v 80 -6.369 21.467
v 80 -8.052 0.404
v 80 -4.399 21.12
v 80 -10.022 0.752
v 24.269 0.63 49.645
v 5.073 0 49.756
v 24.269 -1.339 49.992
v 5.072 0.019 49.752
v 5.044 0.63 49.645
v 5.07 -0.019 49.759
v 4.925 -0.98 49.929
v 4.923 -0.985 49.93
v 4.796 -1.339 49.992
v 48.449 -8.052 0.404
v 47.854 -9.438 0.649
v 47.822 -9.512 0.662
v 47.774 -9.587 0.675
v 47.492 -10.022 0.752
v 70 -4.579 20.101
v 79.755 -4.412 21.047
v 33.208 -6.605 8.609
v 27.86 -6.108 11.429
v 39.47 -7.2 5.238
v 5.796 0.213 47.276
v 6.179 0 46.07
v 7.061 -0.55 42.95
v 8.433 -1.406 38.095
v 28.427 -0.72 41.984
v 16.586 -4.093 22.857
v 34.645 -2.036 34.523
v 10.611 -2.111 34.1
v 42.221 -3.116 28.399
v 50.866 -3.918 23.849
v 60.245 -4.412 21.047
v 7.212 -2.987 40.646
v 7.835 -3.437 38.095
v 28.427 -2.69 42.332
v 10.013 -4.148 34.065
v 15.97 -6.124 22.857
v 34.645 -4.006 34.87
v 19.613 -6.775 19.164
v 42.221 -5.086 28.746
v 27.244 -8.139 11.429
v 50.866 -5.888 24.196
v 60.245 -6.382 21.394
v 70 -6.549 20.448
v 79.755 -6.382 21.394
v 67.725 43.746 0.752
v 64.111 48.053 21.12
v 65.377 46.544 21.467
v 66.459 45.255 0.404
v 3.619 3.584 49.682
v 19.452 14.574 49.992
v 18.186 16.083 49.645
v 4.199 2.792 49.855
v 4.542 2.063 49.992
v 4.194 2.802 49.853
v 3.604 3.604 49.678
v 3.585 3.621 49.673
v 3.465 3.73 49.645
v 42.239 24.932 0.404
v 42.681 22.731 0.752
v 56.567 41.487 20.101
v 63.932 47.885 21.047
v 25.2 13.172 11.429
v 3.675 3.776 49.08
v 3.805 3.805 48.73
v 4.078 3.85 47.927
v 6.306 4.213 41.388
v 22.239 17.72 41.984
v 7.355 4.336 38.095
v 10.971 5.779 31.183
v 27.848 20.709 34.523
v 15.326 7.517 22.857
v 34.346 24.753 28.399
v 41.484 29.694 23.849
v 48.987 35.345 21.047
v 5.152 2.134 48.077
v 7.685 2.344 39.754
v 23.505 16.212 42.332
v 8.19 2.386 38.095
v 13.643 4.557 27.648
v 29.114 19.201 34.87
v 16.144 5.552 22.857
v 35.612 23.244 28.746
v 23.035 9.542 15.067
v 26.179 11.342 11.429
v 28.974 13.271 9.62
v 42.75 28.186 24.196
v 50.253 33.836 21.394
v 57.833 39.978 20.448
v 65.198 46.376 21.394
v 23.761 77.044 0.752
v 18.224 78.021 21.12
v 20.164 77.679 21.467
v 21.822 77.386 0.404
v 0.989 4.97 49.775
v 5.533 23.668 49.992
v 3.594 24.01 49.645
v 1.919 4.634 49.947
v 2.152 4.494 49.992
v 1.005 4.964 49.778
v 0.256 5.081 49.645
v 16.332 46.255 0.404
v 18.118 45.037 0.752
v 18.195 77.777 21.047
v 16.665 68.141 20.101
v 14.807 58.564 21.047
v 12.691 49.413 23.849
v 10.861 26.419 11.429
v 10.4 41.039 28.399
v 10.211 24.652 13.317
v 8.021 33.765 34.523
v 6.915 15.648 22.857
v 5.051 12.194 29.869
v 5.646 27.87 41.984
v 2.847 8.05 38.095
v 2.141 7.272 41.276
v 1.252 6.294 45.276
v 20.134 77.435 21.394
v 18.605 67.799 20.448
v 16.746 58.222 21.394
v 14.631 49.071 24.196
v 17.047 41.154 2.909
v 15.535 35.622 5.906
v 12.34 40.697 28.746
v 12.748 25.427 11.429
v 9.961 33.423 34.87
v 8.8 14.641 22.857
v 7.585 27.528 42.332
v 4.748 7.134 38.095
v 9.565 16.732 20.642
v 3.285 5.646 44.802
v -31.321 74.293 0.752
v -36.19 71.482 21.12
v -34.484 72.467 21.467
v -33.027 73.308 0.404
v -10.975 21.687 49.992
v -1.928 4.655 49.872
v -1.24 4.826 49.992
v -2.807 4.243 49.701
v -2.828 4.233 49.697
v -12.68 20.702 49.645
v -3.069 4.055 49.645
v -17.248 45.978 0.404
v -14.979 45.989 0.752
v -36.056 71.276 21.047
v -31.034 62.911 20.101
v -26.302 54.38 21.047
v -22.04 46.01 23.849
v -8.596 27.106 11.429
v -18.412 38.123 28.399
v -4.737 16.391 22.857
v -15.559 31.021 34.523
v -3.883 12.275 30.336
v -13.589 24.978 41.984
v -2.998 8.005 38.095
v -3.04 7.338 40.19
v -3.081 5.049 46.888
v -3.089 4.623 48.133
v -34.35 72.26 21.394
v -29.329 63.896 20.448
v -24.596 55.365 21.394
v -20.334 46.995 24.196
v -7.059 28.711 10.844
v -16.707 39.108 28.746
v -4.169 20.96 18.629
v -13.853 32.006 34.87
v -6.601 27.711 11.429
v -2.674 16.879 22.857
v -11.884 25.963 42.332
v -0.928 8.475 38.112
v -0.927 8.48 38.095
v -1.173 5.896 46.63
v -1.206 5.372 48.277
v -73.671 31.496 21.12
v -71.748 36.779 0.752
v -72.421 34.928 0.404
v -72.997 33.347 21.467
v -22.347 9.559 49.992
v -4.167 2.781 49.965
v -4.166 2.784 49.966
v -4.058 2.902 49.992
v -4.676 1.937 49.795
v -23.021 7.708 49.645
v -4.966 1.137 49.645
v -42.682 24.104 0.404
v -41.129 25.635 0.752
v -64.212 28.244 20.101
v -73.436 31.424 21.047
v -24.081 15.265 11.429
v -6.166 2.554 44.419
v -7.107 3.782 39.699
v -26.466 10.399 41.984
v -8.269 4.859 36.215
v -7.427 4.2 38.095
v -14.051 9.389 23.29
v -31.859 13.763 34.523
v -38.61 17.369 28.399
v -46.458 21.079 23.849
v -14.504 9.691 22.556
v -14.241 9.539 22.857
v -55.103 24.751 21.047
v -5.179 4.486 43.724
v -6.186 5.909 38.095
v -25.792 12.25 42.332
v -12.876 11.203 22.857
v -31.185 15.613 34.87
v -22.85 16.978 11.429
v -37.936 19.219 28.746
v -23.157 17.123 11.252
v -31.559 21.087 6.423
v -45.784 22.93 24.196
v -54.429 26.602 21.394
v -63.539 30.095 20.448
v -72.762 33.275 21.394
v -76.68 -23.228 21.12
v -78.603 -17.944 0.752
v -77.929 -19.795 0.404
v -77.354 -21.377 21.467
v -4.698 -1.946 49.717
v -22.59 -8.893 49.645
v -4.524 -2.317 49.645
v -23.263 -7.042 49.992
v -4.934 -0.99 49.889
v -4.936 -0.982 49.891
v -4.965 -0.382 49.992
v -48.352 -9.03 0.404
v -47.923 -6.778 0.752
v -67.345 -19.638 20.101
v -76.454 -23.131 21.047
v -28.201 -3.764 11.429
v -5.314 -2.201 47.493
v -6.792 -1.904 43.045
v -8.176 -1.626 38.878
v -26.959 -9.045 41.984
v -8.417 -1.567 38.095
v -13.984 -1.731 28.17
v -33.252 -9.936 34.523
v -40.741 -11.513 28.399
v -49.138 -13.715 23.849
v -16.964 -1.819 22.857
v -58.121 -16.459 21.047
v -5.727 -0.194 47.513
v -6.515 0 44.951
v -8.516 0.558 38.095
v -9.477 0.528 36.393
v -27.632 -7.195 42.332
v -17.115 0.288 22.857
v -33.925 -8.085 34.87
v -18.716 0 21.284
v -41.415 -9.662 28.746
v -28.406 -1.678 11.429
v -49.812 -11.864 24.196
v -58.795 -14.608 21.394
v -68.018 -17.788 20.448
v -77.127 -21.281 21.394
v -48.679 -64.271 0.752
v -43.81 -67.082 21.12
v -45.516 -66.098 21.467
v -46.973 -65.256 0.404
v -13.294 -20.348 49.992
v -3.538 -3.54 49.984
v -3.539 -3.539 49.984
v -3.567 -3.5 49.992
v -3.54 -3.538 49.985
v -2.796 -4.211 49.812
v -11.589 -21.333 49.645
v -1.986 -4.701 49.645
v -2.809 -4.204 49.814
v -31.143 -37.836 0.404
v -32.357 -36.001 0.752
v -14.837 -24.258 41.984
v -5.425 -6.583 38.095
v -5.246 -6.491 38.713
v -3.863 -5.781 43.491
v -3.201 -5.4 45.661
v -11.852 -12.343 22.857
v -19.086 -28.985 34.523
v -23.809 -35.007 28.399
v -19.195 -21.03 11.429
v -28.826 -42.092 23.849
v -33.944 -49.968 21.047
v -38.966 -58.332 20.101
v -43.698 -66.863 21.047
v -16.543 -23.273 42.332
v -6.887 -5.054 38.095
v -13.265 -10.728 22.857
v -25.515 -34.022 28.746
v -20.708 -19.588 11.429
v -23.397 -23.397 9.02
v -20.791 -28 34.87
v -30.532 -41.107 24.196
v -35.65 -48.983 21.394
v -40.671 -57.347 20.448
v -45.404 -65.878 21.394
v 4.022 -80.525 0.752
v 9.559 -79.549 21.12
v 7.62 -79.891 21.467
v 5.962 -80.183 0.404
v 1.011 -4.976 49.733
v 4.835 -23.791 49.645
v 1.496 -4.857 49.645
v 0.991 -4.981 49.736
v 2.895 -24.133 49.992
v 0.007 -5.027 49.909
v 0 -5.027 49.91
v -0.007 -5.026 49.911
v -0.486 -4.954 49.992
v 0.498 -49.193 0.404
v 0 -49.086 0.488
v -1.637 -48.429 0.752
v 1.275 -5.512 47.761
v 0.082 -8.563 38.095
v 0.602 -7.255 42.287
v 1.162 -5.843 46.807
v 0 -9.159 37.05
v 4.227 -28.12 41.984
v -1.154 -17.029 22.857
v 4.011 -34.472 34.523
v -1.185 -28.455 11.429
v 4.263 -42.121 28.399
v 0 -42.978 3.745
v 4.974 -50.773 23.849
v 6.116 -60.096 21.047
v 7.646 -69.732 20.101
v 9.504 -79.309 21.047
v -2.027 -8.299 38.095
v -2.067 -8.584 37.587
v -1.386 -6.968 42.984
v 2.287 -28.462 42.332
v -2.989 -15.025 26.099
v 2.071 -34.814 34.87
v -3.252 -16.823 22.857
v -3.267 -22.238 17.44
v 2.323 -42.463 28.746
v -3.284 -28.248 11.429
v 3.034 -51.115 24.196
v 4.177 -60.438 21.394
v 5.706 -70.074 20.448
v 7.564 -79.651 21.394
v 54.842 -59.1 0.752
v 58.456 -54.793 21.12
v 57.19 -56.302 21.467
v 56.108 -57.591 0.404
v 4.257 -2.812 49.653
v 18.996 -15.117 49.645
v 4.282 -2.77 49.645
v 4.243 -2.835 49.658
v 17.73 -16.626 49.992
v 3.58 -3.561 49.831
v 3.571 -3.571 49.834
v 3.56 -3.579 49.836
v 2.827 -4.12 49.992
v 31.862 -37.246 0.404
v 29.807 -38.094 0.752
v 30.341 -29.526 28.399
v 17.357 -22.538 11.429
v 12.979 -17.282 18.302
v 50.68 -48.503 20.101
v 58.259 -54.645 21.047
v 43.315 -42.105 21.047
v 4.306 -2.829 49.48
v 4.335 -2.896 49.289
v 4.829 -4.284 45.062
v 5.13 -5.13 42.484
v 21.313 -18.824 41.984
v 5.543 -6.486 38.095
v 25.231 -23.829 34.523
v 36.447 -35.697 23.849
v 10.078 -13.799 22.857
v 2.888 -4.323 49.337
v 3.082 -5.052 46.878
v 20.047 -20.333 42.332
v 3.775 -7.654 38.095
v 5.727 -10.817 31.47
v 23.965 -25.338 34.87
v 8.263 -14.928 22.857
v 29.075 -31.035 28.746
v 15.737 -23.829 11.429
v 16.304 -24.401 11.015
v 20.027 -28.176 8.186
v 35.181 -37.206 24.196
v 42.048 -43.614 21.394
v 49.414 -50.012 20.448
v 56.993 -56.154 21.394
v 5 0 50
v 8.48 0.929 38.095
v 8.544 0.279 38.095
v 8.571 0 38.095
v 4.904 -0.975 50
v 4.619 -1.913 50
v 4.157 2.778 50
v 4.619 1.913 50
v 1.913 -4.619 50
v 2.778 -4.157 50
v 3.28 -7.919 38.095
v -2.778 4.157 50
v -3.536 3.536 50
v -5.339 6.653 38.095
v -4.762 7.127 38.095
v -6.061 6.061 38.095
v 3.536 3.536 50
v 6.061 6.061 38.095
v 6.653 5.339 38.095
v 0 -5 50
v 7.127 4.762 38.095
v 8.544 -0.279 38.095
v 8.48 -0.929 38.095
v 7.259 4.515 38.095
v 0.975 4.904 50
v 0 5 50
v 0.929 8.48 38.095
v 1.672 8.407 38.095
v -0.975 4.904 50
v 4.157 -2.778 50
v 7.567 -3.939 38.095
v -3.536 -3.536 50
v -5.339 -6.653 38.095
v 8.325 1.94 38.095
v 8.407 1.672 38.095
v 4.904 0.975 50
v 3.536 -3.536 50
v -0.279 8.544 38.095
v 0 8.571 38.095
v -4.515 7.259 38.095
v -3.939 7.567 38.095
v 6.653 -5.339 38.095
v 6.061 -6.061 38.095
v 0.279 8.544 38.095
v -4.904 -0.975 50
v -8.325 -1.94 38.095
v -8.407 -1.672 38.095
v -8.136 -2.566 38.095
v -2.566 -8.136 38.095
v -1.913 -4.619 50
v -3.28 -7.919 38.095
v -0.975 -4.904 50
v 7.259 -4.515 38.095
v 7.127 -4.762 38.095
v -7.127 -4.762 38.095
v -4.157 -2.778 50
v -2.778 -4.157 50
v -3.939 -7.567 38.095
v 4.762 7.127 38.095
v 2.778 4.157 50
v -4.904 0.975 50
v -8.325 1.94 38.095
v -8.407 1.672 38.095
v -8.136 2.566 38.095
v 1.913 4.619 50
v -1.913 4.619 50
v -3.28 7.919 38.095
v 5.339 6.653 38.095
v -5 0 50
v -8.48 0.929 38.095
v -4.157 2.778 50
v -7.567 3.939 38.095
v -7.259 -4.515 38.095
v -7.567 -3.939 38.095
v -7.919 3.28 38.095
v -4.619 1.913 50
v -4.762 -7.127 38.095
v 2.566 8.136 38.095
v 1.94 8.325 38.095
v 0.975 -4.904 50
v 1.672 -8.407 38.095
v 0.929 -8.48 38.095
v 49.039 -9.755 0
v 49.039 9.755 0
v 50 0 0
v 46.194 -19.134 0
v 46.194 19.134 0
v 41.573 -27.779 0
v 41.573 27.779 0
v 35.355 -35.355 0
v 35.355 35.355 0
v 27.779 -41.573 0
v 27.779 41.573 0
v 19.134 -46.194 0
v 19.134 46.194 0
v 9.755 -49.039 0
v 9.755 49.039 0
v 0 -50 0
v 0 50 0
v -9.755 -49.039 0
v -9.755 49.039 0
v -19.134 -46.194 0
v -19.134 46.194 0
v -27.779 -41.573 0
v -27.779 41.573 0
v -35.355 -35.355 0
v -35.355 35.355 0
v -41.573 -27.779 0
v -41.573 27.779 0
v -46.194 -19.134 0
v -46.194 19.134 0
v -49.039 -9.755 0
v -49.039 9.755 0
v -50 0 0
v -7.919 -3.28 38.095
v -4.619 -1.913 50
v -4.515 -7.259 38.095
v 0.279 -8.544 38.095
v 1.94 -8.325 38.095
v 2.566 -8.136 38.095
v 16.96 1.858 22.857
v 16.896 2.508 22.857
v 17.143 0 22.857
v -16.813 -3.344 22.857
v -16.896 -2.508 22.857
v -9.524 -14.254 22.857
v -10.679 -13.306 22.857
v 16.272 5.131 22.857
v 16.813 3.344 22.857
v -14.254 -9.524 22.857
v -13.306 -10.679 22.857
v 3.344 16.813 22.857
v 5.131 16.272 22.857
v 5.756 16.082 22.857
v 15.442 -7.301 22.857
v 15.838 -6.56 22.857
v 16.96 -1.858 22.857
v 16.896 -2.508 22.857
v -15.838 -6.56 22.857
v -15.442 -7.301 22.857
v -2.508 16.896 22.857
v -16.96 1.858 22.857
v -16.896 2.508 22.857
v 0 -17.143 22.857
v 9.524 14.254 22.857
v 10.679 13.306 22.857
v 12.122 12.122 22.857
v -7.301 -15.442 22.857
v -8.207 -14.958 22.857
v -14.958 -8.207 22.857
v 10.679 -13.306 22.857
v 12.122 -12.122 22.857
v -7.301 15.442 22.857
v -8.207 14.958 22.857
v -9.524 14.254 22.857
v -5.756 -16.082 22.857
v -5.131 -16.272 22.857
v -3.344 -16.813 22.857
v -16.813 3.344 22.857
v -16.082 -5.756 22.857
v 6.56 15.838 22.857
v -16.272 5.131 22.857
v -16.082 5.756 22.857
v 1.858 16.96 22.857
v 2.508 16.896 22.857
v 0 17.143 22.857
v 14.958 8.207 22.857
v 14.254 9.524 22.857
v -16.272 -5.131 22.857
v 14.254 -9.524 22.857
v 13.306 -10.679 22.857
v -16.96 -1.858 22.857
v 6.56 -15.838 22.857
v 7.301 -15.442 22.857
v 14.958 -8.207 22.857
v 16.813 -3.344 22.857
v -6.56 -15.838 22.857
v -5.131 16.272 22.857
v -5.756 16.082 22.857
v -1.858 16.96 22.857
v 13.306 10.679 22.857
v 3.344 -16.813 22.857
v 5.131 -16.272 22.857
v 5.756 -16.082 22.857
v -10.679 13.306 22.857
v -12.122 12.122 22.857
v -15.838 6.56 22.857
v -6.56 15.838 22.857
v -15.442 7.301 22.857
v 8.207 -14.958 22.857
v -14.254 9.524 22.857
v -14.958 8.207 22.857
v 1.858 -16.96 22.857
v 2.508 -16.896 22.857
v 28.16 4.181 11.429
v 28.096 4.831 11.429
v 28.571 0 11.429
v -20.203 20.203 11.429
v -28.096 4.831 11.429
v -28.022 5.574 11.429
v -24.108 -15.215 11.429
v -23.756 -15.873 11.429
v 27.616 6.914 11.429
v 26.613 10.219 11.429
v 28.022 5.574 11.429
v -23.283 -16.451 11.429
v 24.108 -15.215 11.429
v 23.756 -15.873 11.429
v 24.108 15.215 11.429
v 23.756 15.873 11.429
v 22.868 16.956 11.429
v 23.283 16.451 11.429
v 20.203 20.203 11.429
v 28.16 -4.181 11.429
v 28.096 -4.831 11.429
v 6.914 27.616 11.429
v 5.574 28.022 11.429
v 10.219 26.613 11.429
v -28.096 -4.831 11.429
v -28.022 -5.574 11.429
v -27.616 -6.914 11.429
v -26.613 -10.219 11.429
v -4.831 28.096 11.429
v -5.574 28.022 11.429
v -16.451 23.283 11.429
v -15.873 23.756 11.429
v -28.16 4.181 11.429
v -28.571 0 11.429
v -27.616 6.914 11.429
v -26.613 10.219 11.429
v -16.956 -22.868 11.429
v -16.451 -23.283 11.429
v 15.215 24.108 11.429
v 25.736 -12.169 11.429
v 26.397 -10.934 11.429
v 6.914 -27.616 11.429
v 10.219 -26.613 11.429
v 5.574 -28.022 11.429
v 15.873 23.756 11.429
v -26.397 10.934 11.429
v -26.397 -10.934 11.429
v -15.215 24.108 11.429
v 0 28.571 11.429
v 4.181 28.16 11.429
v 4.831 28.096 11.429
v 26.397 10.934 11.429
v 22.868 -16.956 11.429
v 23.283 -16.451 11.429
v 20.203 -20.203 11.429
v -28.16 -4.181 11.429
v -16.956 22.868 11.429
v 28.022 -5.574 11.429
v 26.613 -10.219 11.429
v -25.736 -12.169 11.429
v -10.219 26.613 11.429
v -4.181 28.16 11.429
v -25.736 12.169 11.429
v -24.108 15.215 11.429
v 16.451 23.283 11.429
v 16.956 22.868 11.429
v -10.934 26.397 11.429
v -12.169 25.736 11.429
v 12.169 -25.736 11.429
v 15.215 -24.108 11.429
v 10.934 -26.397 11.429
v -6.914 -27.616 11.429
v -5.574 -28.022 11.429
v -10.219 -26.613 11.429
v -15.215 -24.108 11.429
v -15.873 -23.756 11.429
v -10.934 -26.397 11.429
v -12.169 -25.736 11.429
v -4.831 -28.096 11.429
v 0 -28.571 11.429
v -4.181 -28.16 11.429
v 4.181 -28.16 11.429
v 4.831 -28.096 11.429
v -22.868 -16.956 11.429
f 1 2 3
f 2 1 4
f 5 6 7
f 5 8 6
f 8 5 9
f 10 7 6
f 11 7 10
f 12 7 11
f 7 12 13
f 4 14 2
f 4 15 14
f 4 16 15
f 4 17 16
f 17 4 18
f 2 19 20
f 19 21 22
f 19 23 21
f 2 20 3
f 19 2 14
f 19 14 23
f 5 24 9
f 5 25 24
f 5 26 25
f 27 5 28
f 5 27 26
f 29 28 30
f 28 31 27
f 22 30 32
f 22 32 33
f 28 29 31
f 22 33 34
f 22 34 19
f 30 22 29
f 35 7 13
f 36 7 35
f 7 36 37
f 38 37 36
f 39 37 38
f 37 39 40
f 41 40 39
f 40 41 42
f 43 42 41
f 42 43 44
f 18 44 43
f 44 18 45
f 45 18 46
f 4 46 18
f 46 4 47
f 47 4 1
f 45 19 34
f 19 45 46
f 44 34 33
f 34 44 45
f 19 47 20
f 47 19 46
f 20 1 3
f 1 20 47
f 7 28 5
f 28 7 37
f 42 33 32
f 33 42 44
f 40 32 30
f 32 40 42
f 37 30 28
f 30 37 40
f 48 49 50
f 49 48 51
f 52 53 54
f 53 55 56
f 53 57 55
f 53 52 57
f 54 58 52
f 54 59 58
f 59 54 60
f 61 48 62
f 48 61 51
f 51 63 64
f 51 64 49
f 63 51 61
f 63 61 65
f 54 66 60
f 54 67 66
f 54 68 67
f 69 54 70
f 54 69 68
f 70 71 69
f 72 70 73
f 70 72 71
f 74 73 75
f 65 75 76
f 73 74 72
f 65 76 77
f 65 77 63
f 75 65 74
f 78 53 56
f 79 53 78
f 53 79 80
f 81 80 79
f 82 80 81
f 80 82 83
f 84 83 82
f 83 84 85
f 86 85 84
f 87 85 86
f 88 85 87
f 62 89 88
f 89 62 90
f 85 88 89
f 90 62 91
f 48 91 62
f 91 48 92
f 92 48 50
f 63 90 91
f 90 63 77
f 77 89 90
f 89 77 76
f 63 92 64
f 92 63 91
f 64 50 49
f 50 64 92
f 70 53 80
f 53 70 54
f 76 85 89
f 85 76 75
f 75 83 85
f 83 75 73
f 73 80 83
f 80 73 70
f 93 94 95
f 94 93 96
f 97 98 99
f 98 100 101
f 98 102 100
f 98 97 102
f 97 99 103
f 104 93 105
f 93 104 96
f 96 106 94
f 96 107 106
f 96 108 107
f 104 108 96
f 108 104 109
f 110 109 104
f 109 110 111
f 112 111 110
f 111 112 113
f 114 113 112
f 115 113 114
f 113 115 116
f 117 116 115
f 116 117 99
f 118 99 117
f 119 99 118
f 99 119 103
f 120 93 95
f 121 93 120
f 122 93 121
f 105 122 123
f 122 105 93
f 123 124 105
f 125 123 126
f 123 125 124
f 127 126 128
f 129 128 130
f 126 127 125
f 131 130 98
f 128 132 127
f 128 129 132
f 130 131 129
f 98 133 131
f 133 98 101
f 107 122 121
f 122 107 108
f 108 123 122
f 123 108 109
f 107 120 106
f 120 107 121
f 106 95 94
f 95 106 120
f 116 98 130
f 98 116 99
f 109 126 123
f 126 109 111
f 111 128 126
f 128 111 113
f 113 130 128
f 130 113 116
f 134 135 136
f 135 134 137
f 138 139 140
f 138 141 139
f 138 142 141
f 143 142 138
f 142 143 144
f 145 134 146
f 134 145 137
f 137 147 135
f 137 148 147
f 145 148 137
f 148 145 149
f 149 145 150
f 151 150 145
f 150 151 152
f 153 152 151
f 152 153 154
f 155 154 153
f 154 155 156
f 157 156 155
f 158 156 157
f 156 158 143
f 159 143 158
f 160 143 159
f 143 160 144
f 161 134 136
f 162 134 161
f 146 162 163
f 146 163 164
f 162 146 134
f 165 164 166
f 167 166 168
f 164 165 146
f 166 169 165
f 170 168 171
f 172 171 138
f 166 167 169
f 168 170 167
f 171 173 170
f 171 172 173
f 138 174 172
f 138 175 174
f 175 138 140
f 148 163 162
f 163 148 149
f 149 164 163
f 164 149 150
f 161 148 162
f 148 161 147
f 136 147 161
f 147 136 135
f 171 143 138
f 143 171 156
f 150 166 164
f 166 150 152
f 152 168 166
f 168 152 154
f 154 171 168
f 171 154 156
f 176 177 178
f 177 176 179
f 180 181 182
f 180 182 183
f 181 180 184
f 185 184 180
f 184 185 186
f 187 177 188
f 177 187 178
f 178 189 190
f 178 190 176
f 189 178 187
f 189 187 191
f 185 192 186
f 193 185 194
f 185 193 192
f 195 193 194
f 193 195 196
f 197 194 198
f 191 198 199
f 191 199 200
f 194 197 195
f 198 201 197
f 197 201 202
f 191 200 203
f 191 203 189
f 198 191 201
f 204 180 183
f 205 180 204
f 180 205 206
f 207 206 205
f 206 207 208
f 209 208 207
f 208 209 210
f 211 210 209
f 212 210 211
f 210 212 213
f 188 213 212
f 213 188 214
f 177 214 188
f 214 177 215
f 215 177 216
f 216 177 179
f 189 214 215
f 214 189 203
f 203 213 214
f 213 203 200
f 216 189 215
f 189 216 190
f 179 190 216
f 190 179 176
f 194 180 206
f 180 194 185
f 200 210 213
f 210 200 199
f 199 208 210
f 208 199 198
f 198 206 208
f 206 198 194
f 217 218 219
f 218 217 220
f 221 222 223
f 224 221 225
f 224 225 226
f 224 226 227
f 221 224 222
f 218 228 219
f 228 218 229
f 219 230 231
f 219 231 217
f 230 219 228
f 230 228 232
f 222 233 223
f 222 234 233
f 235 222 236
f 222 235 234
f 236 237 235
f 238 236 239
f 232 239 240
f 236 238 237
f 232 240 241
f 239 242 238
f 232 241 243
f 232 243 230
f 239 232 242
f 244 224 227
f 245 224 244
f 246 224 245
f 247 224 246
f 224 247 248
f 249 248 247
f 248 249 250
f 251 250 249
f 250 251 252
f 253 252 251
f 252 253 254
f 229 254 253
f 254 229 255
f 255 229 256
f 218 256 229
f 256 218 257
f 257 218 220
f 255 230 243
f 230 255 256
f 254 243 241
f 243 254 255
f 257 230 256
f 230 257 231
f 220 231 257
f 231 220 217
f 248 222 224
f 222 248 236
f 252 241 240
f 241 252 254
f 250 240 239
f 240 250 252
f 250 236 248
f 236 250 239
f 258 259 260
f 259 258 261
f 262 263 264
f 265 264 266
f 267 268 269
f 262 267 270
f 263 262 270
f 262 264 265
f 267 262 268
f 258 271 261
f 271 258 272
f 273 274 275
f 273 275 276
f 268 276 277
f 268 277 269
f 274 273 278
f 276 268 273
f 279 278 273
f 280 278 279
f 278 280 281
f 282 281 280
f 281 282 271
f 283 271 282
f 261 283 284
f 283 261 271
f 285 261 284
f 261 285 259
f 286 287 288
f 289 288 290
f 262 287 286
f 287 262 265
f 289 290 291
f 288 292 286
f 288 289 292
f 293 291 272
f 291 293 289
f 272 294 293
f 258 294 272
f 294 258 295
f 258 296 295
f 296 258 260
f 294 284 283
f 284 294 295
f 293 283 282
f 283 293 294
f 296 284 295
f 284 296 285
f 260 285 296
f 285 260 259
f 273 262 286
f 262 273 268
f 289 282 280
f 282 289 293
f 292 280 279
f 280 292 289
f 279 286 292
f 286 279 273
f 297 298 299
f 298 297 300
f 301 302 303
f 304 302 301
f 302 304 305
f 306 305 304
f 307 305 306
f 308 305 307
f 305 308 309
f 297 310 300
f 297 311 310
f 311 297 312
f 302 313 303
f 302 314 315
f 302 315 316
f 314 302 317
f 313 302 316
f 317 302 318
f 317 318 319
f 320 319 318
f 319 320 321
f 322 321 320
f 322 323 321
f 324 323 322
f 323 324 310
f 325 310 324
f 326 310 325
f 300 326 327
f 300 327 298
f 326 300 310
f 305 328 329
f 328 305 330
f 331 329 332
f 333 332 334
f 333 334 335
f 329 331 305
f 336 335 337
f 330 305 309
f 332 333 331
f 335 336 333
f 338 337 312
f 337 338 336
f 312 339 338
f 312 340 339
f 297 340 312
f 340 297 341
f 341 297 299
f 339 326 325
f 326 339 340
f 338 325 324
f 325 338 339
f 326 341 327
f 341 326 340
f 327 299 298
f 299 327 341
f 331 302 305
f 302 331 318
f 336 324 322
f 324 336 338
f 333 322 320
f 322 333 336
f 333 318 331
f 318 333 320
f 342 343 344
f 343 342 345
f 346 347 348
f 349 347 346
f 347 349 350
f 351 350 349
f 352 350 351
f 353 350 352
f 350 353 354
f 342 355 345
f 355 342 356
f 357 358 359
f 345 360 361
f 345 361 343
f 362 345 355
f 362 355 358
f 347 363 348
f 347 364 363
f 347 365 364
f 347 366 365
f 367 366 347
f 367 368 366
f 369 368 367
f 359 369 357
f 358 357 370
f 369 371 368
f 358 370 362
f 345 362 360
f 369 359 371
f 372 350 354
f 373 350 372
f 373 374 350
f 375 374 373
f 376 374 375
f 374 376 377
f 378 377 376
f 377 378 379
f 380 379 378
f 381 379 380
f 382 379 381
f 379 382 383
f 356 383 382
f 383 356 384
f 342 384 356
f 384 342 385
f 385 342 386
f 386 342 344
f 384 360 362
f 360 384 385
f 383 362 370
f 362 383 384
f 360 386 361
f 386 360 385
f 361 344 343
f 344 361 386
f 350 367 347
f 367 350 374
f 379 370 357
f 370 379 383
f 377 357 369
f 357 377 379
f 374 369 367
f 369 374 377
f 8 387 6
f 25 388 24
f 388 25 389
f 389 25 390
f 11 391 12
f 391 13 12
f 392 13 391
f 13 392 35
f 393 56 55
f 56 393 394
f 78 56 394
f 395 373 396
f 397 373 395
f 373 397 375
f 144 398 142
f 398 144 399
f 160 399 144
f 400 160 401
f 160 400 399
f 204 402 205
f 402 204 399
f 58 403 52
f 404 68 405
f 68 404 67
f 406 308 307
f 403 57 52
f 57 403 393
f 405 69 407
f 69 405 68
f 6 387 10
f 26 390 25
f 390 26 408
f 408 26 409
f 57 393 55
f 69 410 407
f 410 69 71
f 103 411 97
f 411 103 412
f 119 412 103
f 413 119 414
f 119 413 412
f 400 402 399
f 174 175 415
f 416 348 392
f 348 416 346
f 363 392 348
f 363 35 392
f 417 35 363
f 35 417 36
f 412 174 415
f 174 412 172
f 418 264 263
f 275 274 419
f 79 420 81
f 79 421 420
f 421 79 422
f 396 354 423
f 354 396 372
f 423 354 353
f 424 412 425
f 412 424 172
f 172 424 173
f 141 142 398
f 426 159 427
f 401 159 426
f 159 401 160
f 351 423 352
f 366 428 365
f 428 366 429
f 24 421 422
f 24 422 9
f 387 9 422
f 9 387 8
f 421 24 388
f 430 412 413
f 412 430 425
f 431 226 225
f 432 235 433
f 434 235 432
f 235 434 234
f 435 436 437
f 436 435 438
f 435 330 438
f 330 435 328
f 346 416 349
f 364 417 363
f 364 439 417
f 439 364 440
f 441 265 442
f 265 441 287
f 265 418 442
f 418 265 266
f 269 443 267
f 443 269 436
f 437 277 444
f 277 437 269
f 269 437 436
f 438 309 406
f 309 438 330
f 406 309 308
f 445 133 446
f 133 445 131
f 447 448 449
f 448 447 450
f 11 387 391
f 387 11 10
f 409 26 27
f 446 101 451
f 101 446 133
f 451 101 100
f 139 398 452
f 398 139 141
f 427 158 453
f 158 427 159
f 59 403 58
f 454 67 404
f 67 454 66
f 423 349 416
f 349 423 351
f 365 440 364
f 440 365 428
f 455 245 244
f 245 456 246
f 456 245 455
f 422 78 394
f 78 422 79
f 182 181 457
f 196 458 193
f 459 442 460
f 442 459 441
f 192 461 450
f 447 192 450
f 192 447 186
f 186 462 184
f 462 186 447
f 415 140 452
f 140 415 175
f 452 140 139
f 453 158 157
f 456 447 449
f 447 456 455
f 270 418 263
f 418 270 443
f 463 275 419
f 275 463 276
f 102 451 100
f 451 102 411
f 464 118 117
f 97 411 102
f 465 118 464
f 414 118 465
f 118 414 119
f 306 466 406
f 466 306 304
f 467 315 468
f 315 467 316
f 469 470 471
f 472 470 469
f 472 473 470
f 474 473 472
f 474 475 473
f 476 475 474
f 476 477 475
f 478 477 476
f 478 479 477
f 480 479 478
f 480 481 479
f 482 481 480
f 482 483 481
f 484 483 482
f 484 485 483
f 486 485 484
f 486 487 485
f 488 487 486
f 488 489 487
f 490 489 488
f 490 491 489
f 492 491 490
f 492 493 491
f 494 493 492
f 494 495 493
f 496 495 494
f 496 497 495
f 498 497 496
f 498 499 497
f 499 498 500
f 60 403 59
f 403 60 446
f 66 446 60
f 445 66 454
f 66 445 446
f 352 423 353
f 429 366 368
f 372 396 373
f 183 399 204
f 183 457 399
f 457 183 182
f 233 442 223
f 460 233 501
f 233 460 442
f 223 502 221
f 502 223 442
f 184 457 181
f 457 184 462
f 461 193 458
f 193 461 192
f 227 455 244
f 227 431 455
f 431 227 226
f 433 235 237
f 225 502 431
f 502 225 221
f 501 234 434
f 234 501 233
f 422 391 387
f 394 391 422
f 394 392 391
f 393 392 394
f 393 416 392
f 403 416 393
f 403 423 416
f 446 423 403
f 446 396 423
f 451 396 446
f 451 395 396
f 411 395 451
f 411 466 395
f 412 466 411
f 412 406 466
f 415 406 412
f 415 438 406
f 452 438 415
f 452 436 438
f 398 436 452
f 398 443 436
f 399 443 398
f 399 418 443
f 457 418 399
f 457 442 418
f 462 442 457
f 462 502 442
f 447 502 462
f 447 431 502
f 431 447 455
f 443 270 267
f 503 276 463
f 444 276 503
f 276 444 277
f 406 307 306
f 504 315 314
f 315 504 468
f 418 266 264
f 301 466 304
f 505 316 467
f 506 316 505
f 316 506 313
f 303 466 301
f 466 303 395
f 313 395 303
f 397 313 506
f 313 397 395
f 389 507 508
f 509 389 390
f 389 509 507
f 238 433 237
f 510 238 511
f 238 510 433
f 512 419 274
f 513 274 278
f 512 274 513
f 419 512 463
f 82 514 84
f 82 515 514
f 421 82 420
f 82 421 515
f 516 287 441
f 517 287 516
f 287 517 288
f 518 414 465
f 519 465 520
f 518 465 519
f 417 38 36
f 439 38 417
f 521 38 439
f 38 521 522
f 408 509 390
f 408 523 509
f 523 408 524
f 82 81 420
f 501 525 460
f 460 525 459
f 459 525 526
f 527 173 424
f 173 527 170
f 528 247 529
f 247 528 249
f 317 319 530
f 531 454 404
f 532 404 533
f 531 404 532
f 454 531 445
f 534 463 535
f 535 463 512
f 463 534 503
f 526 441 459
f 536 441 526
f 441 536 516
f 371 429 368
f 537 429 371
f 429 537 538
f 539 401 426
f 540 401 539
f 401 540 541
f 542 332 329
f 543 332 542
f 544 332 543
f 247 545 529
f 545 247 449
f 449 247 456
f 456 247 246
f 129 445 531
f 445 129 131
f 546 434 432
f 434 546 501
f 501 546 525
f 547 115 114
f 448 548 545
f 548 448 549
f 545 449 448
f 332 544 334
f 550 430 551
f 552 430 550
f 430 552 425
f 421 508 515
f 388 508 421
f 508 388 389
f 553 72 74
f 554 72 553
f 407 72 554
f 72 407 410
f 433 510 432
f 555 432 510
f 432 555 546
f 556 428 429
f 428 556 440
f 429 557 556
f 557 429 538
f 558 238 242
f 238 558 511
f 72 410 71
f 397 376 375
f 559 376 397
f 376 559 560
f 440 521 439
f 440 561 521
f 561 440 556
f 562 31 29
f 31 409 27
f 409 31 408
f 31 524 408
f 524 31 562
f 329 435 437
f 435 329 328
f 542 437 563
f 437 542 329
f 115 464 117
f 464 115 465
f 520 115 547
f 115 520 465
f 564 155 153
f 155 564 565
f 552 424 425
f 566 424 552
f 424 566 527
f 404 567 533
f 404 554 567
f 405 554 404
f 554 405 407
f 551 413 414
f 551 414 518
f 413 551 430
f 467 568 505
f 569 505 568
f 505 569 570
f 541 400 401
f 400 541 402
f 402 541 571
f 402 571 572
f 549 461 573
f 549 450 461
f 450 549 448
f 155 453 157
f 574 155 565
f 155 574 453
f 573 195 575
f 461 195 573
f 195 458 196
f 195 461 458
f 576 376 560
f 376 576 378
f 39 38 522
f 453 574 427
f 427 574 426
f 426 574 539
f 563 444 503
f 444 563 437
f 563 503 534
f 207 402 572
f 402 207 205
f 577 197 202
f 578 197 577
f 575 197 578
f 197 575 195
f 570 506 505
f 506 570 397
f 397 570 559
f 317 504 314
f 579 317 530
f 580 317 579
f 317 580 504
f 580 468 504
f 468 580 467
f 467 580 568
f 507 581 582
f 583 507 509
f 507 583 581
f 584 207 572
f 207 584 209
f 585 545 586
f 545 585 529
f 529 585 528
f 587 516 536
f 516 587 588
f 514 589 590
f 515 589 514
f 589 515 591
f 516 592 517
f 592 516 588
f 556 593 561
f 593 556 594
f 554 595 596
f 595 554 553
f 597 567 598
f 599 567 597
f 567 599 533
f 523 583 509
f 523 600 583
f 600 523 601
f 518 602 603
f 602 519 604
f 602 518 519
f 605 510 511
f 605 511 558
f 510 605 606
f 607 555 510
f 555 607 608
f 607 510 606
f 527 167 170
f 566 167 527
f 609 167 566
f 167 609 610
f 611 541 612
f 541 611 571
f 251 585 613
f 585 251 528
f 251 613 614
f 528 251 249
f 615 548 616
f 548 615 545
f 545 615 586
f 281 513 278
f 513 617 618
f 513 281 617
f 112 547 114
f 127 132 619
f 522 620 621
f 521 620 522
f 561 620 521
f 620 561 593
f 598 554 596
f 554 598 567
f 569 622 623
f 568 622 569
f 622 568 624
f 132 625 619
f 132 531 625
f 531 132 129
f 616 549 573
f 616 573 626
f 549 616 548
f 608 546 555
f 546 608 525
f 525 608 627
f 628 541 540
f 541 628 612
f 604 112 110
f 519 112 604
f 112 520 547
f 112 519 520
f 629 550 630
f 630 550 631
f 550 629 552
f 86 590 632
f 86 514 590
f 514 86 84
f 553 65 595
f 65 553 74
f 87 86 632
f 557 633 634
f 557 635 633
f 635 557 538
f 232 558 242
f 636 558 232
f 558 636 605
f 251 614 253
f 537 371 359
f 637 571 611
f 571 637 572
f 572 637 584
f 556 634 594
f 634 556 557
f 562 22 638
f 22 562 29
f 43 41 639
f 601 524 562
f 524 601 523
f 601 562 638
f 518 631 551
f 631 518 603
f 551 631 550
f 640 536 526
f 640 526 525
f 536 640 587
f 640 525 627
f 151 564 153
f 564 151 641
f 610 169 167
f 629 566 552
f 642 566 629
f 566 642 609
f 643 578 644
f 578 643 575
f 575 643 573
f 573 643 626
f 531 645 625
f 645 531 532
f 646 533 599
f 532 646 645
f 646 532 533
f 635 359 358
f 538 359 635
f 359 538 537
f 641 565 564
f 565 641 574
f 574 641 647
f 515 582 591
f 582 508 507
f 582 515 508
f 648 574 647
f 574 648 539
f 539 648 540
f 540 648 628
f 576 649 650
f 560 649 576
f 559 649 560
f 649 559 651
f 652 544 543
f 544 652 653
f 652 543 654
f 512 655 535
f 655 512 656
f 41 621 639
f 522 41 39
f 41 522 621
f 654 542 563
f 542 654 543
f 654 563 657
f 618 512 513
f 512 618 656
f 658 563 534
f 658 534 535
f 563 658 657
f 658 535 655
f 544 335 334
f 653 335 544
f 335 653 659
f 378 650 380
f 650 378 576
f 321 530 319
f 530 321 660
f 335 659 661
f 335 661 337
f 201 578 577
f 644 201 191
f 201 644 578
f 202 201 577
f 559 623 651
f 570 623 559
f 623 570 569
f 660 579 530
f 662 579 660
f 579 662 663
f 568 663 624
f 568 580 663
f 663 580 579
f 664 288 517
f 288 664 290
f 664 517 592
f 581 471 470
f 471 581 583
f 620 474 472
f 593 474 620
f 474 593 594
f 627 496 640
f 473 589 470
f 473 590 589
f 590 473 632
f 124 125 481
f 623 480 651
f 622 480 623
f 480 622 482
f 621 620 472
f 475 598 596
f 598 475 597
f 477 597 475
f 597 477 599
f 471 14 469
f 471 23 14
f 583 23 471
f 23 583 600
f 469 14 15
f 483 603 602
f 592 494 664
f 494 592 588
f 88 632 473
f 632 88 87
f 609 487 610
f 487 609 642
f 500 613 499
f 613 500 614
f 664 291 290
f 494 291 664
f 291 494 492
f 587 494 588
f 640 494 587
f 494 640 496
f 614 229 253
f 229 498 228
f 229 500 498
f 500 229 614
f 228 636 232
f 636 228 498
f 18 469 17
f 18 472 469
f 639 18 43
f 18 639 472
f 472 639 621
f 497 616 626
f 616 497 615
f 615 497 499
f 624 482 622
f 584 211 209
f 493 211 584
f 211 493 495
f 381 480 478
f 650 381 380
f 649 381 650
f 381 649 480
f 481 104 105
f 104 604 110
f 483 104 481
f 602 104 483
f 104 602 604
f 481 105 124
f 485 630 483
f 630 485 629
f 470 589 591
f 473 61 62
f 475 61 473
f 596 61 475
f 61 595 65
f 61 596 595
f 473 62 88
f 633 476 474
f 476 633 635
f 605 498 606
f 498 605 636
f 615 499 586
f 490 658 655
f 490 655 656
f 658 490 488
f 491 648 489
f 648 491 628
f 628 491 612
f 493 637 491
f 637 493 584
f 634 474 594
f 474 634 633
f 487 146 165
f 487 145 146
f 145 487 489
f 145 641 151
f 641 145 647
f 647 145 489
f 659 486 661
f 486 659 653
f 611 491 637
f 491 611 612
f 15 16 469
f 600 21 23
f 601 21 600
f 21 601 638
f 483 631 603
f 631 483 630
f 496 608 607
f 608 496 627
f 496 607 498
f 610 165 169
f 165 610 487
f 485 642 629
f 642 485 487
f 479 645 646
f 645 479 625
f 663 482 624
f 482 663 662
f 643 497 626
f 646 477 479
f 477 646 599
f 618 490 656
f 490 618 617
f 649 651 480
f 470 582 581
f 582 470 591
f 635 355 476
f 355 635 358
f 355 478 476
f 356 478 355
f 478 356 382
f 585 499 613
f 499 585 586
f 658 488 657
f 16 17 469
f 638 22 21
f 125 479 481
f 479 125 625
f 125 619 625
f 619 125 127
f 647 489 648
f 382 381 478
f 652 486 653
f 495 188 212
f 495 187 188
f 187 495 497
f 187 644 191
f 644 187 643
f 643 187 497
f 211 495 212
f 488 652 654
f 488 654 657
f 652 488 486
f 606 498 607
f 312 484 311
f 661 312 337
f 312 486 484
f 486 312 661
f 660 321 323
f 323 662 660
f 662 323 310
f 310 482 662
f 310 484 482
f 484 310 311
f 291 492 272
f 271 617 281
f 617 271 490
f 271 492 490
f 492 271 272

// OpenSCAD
$fn = 32;

blade_thick =  2;

cylinder(h=50, r1=20, r2=5);
cylinder(h=40, r1=30, r2=7.5);
cylinder(h=30, r1=40, r2=10);
cylinder(h=20, r1=50, r2=12.5);

for (a=[0:40:360]) {
    rotate([-10, 0, a]) translate([0, -10, -1]) difference() {
        cube([80, blade_thick, 50]);
        translate([70, -0.01, 70]) rotate([-90, 0, 0]) 
          cylinder(h=blade_thick + 0.02, r=50);
    }
}
